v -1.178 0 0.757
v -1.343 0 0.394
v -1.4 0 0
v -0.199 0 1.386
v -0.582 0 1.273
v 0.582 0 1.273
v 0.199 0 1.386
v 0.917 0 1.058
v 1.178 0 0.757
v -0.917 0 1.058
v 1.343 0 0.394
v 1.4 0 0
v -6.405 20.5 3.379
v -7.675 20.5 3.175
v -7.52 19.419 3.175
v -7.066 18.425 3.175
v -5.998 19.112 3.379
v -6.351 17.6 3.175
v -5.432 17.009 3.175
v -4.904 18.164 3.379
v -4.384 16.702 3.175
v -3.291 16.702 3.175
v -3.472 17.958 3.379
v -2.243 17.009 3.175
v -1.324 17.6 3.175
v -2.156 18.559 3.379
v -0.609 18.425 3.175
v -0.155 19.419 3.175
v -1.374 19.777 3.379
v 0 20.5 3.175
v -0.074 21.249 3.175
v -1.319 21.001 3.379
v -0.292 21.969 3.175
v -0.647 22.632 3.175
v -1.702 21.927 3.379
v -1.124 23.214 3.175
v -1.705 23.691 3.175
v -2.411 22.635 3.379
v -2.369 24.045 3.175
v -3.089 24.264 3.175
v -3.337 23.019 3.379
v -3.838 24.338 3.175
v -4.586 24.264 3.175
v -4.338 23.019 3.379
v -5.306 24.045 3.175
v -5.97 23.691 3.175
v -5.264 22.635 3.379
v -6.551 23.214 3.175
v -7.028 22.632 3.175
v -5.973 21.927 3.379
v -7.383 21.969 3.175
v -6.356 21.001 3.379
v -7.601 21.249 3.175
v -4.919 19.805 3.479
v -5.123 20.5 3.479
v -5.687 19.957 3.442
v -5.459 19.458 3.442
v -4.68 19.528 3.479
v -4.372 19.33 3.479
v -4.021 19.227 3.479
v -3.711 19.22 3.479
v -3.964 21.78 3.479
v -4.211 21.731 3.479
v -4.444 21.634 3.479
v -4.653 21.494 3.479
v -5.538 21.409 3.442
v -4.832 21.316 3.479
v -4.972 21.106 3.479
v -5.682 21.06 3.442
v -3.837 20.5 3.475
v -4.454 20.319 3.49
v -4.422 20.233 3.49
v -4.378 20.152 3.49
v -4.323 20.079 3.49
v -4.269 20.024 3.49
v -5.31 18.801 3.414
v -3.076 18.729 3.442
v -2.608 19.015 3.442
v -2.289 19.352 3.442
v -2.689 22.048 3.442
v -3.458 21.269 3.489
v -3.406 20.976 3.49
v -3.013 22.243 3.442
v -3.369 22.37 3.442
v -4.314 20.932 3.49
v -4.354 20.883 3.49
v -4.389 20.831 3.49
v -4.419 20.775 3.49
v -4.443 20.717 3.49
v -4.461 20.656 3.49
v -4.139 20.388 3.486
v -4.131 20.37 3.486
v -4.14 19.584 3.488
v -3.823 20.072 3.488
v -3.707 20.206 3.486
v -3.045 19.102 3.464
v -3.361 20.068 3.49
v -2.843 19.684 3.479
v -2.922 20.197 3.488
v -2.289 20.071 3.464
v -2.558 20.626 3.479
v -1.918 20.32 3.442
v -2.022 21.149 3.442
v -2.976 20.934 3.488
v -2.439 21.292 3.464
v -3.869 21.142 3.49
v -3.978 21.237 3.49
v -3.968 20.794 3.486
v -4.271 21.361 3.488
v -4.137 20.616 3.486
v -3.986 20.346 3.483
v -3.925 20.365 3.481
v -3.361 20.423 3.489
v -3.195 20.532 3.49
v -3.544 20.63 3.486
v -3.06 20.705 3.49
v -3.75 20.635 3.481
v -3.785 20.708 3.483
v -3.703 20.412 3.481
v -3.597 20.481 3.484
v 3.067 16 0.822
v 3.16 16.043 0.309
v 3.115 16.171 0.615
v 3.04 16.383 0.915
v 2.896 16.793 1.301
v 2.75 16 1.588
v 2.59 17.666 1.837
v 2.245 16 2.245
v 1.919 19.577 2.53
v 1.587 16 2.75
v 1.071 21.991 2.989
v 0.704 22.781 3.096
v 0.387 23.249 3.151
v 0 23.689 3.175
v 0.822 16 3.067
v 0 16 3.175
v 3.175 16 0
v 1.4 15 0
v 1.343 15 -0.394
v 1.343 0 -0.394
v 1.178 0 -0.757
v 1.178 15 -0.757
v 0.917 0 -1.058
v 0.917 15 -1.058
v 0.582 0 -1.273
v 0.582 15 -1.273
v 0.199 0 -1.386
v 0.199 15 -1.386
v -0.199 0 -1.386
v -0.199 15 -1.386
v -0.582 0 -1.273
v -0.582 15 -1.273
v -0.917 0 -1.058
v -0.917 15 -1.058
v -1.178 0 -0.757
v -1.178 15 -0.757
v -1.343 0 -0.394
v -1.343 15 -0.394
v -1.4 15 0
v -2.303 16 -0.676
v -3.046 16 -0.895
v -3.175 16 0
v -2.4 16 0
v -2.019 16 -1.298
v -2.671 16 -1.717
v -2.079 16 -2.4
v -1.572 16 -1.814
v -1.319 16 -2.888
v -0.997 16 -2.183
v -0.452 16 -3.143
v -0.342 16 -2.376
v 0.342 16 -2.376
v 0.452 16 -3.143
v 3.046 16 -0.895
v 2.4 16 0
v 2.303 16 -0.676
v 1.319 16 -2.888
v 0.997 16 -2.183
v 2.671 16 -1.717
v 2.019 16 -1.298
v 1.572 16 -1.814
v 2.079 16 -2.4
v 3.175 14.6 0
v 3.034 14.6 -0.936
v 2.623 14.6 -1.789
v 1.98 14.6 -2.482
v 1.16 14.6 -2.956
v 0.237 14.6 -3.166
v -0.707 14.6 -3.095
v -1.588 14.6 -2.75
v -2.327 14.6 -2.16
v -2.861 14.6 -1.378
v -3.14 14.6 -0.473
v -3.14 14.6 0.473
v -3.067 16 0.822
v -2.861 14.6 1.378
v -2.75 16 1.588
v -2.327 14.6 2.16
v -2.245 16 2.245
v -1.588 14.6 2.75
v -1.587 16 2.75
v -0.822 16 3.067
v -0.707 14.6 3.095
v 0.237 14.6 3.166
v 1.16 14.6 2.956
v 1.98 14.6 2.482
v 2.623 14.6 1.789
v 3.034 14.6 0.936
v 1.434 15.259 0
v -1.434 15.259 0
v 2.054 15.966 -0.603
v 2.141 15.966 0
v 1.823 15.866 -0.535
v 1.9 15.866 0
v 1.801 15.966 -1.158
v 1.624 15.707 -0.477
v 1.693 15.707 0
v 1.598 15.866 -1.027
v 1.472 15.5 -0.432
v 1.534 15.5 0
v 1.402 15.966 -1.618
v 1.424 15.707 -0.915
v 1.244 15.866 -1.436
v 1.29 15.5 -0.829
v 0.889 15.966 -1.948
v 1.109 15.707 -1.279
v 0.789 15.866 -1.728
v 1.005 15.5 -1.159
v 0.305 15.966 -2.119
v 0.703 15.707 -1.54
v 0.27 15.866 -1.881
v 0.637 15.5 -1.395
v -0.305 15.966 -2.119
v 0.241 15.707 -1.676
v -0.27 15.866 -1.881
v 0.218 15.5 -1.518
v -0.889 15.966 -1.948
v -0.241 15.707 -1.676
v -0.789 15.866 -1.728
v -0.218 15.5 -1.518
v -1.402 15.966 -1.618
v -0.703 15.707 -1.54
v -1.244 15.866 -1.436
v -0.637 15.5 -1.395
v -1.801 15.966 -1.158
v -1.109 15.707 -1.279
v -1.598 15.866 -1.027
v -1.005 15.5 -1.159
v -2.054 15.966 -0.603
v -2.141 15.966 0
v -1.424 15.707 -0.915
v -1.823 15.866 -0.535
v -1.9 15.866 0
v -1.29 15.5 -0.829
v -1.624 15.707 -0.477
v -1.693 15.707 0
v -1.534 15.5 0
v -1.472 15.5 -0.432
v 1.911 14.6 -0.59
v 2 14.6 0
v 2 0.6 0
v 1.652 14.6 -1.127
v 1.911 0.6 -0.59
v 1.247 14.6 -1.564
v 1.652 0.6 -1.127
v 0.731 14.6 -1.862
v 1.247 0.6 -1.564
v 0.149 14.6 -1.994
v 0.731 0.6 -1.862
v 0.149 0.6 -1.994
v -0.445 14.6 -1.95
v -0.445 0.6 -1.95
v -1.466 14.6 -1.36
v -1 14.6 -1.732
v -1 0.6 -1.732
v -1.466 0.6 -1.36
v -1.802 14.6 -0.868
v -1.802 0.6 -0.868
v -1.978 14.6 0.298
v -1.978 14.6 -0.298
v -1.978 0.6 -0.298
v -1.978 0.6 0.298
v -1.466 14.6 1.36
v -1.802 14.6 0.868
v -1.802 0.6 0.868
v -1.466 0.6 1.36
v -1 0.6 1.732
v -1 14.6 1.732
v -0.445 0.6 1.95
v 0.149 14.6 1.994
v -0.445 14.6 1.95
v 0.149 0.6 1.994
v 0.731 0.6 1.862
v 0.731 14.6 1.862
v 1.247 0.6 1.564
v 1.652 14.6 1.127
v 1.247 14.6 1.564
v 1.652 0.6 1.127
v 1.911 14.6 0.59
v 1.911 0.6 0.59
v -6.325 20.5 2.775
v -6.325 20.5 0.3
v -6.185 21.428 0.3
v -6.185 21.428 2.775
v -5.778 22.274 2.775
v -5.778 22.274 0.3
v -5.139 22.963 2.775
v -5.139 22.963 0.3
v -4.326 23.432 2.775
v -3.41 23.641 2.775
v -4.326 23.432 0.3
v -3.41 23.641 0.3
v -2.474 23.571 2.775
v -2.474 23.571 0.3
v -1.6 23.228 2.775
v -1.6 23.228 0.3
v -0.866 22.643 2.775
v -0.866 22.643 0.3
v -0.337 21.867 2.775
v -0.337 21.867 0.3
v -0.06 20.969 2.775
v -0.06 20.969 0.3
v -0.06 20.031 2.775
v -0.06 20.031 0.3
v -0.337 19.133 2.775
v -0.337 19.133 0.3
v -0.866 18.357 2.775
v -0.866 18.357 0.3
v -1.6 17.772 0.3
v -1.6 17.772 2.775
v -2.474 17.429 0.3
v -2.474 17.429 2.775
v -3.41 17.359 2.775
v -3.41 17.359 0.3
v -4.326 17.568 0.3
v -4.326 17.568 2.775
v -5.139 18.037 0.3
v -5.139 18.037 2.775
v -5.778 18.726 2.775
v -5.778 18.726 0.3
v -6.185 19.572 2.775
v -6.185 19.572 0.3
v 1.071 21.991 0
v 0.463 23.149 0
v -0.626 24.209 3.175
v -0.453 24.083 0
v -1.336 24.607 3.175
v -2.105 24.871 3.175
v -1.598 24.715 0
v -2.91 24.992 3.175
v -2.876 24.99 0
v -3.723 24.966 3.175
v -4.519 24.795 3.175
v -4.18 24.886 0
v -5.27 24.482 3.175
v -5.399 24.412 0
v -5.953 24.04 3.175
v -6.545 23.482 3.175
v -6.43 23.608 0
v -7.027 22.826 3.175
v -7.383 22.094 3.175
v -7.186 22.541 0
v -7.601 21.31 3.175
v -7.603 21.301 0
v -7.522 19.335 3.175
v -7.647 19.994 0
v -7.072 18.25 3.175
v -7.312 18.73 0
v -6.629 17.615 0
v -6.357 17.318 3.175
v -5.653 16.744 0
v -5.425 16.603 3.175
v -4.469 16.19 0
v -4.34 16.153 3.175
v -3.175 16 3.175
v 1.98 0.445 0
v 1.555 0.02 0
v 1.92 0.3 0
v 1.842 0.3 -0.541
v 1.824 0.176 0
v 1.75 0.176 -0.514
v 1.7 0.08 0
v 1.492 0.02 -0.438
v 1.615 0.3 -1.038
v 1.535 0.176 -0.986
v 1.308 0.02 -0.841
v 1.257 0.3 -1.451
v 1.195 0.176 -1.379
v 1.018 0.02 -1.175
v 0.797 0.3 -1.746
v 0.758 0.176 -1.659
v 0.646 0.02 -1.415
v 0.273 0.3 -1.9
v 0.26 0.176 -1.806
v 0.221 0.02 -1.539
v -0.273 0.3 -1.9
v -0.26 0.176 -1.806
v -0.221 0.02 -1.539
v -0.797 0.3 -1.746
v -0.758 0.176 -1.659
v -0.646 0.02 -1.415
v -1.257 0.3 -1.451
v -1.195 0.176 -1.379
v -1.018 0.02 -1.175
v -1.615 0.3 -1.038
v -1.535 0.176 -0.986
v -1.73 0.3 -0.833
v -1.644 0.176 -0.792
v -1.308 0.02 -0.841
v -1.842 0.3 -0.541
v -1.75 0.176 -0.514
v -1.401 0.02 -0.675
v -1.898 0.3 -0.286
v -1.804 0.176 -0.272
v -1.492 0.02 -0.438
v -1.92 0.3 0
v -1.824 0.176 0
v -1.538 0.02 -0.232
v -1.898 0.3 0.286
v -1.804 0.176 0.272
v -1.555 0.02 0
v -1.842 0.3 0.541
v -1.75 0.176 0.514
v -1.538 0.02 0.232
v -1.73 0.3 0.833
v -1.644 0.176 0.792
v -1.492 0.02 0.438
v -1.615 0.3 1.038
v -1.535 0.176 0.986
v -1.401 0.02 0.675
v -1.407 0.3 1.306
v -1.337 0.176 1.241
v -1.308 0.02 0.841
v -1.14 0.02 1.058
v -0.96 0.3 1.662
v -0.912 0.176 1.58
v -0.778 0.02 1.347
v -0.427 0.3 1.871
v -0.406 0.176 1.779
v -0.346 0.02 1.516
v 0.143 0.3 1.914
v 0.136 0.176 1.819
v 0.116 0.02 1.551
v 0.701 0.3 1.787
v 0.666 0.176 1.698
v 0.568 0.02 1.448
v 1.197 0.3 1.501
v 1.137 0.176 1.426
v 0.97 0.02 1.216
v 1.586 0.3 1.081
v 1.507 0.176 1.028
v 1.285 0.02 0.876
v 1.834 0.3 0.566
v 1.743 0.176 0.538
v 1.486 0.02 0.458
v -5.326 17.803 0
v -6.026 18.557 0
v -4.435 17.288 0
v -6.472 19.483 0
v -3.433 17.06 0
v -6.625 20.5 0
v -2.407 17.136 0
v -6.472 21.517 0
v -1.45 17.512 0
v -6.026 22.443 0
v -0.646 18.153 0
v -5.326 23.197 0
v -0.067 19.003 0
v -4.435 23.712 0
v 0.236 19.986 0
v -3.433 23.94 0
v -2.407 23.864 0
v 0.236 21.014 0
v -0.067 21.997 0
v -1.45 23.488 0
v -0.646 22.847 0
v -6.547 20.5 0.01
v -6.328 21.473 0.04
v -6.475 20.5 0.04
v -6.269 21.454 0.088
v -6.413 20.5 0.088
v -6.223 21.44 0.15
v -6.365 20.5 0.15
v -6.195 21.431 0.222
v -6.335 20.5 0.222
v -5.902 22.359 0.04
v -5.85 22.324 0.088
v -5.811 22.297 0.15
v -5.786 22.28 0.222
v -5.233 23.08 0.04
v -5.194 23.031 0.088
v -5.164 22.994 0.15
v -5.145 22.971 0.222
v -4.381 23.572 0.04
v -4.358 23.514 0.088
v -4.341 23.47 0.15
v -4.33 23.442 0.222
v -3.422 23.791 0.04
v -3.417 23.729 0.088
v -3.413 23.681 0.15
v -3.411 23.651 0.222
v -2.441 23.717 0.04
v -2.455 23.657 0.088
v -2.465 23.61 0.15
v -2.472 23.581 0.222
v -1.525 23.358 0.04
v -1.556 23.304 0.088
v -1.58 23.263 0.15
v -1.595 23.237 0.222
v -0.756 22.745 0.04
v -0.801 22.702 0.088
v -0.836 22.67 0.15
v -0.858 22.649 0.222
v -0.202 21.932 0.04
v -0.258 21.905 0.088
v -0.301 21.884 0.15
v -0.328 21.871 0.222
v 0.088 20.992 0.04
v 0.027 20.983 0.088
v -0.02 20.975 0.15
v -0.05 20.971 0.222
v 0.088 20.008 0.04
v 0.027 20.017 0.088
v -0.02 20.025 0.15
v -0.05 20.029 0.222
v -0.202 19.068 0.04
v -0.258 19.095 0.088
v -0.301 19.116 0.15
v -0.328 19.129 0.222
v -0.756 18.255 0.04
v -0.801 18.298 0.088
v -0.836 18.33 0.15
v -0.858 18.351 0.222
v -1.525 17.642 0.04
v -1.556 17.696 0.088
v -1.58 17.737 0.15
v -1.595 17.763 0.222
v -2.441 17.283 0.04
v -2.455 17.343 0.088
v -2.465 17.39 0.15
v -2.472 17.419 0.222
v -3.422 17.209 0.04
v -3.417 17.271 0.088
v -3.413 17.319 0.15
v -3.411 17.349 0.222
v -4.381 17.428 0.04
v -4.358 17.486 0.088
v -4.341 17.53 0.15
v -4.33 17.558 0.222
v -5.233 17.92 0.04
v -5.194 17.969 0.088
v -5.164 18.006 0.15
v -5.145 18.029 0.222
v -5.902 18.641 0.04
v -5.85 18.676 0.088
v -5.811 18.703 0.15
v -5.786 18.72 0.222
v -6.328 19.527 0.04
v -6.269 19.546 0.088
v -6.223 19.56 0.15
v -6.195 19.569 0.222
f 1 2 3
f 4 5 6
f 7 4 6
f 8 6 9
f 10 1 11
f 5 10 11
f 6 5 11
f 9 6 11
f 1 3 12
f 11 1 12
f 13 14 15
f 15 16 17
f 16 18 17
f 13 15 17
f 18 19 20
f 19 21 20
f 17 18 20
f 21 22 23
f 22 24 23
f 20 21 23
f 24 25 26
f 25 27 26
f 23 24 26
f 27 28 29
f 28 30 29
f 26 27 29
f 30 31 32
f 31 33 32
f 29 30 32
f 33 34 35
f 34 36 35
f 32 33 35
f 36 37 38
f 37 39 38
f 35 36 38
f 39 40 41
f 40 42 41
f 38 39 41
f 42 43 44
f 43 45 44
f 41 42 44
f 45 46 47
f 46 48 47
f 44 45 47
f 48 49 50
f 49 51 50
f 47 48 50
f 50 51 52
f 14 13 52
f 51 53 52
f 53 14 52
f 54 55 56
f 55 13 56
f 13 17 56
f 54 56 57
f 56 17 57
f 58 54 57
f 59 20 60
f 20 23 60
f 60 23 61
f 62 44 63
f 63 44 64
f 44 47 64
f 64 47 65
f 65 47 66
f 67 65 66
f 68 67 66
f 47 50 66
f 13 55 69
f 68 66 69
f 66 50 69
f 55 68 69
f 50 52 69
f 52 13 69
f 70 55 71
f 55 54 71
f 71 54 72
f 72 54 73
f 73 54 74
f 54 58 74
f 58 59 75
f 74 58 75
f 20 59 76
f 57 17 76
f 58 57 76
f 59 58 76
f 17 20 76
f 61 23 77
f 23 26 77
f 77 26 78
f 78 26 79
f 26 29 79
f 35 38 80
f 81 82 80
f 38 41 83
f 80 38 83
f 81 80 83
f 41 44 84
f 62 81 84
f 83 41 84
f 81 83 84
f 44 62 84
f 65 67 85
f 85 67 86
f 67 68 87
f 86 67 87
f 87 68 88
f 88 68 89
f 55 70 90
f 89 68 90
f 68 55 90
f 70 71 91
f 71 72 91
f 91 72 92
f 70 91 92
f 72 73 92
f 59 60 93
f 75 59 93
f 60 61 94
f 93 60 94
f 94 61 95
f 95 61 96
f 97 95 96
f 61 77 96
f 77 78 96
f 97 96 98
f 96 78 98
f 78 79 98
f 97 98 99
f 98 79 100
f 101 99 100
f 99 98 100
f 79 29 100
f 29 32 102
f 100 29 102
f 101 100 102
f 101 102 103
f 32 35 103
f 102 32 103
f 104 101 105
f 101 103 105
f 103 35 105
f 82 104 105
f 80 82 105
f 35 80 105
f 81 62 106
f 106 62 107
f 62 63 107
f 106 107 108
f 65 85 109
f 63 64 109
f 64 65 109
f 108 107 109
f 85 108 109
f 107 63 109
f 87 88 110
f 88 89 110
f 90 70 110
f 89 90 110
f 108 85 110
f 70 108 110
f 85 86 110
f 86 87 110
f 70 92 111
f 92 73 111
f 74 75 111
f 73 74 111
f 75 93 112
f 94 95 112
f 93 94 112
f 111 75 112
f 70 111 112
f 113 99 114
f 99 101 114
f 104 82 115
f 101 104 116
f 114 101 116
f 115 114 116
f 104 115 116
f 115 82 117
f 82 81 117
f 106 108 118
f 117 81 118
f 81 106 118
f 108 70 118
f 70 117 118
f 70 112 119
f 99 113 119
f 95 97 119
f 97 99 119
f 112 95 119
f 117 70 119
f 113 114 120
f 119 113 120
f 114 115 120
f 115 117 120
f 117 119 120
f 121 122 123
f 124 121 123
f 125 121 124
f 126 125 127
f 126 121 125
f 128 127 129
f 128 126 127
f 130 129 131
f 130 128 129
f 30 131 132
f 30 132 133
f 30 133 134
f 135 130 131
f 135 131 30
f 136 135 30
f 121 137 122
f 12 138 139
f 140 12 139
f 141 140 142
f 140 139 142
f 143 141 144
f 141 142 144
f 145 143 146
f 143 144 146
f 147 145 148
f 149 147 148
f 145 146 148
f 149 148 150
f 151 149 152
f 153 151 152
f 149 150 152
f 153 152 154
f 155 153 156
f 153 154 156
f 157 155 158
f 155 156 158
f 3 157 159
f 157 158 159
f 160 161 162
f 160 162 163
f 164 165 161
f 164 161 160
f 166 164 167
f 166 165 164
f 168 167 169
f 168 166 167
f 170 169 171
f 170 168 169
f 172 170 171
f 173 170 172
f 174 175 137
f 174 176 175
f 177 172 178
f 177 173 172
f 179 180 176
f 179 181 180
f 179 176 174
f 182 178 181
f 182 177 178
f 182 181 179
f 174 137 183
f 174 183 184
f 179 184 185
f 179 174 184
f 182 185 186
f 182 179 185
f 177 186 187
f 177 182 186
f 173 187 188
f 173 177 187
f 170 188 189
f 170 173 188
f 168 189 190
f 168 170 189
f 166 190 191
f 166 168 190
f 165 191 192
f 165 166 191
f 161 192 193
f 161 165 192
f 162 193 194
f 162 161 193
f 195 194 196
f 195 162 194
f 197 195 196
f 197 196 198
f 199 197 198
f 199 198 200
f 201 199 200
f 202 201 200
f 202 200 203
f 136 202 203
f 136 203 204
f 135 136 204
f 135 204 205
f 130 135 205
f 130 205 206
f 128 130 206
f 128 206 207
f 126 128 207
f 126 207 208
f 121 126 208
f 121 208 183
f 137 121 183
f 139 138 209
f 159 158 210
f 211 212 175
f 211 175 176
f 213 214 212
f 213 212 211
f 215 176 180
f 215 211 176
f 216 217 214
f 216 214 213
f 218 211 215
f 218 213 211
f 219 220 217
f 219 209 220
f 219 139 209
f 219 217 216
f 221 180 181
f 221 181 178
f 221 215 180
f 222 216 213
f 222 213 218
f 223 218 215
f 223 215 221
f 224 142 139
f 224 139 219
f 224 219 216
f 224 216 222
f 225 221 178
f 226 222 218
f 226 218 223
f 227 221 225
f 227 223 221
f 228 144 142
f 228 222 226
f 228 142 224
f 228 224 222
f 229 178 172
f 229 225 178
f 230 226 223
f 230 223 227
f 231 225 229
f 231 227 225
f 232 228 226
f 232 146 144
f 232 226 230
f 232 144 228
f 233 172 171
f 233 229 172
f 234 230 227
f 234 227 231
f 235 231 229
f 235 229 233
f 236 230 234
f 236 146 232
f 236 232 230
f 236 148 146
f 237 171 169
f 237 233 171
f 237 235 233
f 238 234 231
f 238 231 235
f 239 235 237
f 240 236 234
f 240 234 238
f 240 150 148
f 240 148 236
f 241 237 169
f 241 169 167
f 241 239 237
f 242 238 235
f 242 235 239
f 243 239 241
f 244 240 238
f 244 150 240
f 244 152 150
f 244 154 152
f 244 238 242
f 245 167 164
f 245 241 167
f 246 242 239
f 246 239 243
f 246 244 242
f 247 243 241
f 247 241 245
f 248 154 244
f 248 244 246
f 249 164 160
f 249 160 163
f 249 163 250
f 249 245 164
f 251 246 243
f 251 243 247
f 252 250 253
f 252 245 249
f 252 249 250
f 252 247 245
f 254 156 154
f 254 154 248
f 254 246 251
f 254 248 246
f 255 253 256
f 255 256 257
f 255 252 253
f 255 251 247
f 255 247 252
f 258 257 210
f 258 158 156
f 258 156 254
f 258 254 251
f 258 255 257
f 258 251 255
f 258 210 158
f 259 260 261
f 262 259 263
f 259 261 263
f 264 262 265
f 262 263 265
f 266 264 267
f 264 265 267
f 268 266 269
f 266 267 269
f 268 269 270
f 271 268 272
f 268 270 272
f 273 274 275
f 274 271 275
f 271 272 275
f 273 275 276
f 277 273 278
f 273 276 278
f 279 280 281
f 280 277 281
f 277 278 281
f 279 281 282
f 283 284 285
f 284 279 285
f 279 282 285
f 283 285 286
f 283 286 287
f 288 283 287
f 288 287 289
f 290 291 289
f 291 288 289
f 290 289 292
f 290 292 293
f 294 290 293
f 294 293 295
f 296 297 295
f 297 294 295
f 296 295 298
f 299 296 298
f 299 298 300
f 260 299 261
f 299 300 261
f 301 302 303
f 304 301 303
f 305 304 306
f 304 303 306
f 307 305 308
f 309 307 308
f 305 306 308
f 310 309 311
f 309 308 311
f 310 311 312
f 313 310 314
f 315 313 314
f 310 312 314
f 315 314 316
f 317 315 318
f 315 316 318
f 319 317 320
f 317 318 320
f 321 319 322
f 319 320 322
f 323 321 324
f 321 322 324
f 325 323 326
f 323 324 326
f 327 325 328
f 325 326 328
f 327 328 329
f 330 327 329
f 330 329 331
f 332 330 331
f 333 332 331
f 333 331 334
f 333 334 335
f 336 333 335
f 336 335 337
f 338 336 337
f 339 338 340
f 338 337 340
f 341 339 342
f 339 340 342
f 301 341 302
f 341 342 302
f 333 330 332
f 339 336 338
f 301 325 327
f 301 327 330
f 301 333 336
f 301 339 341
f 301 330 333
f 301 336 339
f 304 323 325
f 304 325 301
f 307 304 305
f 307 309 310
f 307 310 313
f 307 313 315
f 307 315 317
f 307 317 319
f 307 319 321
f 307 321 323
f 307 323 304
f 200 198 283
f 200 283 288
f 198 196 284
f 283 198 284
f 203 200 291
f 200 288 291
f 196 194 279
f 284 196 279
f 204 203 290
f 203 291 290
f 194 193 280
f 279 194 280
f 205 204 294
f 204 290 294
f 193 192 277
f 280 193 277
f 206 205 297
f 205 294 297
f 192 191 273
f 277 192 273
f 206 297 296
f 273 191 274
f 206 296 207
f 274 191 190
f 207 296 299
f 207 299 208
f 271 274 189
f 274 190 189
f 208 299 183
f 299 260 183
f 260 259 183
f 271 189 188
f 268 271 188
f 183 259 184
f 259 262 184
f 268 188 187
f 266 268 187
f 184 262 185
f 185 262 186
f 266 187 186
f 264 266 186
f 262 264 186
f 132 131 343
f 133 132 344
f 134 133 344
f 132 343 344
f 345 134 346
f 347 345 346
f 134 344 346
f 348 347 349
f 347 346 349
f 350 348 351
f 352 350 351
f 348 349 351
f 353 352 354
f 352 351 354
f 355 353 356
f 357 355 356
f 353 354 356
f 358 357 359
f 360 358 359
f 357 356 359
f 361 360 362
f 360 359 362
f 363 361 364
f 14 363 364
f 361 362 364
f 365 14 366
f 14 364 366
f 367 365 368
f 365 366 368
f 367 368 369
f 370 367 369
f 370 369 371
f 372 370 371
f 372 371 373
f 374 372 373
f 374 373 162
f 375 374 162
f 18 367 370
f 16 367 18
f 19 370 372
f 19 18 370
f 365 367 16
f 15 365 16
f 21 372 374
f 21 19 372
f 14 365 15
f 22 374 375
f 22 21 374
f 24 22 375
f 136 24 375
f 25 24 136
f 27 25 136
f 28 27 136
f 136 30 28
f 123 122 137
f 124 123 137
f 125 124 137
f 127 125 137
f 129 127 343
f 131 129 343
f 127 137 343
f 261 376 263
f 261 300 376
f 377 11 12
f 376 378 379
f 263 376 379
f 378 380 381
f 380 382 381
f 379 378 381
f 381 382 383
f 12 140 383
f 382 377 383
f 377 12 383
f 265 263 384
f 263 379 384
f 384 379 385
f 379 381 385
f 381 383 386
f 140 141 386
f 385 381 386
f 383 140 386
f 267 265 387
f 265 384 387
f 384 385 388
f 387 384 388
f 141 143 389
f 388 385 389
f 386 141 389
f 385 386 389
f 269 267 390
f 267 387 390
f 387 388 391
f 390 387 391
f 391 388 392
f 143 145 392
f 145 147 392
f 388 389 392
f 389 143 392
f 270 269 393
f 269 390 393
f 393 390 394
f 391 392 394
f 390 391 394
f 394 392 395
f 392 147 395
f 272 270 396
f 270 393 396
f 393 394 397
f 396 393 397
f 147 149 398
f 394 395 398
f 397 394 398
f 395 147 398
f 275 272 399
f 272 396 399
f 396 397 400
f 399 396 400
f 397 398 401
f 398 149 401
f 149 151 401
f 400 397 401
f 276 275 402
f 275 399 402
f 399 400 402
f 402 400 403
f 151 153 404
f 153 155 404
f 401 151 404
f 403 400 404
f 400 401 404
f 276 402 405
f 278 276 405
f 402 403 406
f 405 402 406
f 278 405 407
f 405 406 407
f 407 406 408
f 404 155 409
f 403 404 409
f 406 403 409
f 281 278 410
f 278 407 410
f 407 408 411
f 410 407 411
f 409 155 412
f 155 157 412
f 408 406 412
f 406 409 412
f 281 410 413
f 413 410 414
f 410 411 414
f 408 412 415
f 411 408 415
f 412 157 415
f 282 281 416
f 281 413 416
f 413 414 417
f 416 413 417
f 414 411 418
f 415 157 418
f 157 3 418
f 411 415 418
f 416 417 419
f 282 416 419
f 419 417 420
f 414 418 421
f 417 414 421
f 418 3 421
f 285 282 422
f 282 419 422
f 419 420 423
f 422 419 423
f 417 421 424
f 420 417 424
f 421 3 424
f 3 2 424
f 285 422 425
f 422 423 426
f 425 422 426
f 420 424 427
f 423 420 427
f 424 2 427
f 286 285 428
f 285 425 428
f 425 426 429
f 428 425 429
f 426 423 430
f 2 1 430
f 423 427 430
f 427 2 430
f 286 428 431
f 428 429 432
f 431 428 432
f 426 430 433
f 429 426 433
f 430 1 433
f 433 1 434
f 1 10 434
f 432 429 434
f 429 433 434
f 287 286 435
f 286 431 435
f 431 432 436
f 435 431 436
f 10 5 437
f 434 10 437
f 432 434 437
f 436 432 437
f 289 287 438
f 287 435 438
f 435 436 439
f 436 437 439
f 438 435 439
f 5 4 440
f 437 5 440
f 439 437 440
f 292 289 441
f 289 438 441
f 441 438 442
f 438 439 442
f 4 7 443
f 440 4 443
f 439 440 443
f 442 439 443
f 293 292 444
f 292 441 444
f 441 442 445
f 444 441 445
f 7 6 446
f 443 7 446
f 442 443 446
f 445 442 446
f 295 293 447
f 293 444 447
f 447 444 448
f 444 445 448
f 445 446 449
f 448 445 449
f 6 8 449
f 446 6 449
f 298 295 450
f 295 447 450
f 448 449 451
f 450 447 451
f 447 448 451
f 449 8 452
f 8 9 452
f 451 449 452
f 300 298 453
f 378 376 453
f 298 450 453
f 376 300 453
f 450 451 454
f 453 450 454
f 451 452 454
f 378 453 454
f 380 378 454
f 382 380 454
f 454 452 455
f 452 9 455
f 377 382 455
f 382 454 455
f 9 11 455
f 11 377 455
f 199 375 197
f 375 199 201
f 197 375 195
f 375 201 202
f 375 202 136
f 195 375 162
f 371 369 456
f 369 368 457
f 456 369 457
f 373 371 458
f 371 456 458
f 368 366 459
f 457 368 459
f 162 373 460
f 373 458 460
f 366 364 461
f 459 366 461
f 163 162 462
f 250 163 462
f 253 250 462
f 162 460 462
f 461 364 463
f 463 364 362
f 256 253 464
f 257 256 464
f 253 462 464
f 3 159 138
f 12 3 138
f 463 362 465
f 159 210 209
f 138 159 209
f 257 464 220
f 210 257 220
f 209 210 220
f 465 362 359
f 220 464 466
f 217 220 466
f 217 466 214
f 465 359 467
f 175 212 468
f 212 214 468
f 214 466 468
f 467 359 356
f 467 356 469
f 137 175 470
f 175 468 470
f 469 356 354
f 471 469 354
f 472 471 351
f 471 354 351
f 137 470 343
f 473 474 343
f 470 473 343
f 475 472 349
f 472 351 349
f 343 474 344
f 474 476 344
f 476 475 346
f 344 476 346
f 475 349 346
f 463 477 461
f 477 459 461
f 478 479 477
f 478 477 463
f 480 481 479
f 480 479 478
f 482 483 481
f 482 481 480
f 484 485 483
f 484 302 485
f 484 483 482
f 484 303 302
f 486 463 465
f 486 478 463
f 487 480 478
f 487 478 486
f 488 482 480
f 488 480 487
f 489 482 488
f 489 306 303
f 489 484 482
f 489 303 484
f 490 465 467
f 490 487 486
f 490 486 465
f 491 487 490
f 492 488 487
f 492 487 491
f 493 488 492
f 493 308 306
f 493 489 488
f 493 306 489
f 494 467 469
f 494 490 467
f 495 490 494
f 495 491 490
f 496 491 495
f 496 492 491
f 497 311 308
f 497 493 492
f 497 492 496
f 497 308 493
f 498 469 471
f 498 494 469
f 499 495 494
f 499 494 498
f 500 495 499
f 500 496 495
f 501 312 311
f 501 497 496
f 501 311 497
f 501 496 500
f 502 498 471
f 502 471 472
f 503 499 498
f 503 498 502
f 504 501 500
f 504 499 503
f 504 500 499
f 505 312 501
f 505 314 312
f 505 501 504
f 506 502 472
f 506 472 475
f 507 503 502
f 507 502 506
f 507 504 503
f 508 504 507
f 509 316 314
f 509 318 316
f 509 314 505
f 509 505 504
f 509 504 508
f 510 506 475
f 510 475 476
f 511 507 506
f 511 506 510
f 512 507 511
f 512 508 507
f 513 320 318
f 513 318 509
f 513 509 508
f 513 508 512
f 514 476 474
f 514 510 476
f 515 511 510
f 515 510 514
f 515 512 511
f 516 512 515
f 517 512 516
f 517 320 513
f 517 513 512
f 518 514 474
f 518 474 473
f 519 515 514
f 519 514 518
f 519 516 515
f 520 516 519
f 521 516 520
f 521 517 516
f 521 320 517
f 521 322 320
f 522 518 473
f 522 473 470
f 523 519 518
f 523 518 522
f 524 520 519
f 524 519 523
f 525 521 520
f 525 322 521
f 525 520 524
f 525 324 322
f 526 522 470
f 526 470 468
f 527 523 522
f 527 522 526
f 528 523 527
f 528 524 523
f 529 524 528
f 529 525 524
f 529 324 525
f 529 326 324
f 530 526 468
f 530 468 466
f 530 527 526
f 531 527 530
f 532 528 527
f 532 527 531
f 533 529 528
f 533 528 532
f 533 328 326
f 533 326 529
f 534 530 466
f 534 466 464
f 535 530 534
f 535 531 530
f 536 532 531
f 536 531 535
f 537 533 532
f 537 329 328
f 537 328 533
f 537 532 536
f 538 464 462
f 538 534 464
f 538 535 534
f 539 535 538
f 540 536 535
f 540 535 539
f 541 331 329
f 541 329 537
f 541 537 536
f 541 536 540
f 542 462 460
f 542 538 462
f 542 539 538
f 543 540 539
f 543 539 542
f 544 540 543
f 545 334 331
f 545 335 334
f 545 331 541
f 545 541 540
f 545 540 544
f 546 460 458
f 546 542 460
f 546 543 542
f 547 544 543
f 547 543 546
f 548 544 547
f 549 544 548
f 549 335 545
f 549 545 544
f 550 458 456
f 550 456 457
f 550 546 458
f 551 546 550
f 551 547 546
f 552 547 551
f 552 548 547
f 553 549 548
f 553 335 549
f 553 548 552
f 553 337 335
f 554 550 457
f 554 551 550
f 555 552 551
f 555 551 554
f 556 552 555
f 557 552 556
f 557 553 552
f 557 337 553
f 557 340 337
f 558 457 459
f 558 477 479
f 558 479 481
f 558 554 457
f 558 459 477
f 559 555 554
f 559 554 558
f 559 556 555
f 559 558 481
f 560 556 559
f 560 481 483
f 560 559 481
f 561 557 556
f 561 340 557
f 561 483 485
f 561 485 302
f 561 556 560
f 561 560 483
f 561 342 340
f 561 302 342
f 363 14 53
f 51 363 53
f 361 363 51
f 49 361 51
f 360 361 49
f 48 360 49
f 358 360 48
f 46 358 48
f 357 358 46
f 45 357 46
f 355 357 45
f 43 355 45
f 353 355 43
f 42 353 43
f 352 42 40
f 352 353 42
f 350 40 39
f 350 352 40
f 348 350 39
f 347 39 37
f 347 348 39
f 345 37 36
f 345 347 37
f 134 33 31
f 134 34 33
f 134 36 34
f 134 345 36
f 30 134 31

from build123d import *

# Parameters (mm, degrees)
SKETCH_1_R           = 2
EXTRUDE_1_DEPTH      = 16
EXTRUDE_2_DEPTH      = 3.175
SKETCH_4_R           = 3.15
CUT_EXTRUDE_6_DEPTH  = 2.775
FILLET_3_R           = 0.6
SKETCH_7_R           = 3.175
EXTRUDE_3_DEPTH      = 1.4
CUT_EXTRUDE_10_DEPTH = 10
FILLET_4_R           = 0.3
CUT_EXTRUDE_11_REACH = 18
FILLET_5_R           = 1


with BuildPart() as part:
    # 草图1 → 凸台-拉伸1 (new body)
    with BuildSketch(Plane(origin=(0, 0, 0), x_dir=(1, 0, 0), z_dir=(0, 1, 0))):
        Circle(SKETCH_1_R)
    extrude(amount=EXTRUDE_1_DEPTH)

    # 草图2 → 凸台-拉伸2 (add)
    with BuildSketch(Plane.XY):
        with BuildLine():
            Line((3.175, 16), (1.070738578, 21.991208882))
            ThreePointArc((1.070738578, 21.991208882), (-6.846541908, 23.101880092), (-3.175, 16))
            Line((-3.175, 16), (3.175, 16))
        make_face()
    extrude(amount=EXTRUDE_2_DEPTH)

    # 草图4 → 切除-拉伸6 (cut)
    with BuildSketch(Plane(origin=(0, 0, 0), x_dir=(-1, 0, 0), z_dir=(0, 0, -1))):
        with Locations((3.175, 20.5)):
            Circle(SKETCH_4_R)
    extrude(amount=-CUT_EXTRUDE_6_DEPTH, mode=Mode.SUBTRACT)

    # 圆角3
    fillet_3_edges = [part.edges().sort_by_distance(p)[0] for p in [
        (-2, 0, 0),
    ]]
    fillet(fillet_3_edges, radius=FILLET_3_R)

    # 草图7 → 凸台-拉伸3 (add)
    with BuildSketch(Plane(origin=(0, 16, 0), x_dir=(1, 0, 0), z_dir=(0, 1, 0))):
        Circle(SKETCH_7_R)
    extrude(amount=-EXTRUDE_3_DEPTH)

    # 草图11 → 切除-拉伸10 (cut, through all)
    with BuildSketch(Plane.XZ.offset(-16)):
        with BuildLine():
            Line((3.175, 3.175), (3.50604204, 0.275))
            Line((3.50604204, 0.275), (3.175, 0))
            ThreePointArc((3.175, 0), (2.24506403, 2.24506403), (0, 3.175))
            Line((0, 3.175), (3.175, 3.175))
        make_face()
    extrude(amount=-CUT_EXTRUDE_10_DEPTH, mode=Mode.SUBTRACT)

    # 草图12 → 旋转1 (revolve)
    with BuildSketch(Plane(origin=(0, 20.5, 0), x_dir=(-1, 0, 0), z_dir=(0, -1, 0))):
        with BuildLine():
            Line((3.8375, -3.175), (3.8375, -3.475))
            ThreePointArc((3.8375, -3.475), (5.765394552, -3.441974066), (7.675, -3.175))
            Line((7.675, -3.175), (3.8375, -3.175))
        make_face()
    revolve(axis=Axis((-3.8375, 20.5, 3.175), (0, 0, 1)))

    # 圆角4
    fillet_4_edges = [part.edges().sort_by_distance(p)[0] for p in [
        (-0.025, 20.5, 0),
    ]]
    fillet(fillet_4_edges, radius=FILLET_4_R)

    # 草图13 → 切除-拉伸11 (cut, up to next)
    with BuildSketch(Plane(origin=(0, 16, 0), x_dir=(1, 0, 0), z_dir=(0, 1, 0)), mode=Mode.PRIVATE) as cut_extrude_11_sk1:
        with BuildLine():
            Line((-1.4, 0), (1.4, 0))
            ThreePointArc((1.4, 0), (0, 1.4), (-1.4, 0))
        make_face()
    cut_extrude_11_tool1 = extrude(cut_extrude_11_sk1.sketch, amount=-CUT_EXTRUDE_11_REACH, mode=Mode.PRIVATE) & part.part
    add(cut_extrude_11_tool1.solids().sort_by_distance((0, 16, -0.594178))[0], mode=Mode.SUBTRACT)

    # 圆角5
    fillet_5_edges = [part.edges().sort_by_distance(p)[0] for p in [
        (0, 16, -1.4),
    ]]
    fillet(fillet_5_edges, radius=FILLET_5_R)


solid = part.part
